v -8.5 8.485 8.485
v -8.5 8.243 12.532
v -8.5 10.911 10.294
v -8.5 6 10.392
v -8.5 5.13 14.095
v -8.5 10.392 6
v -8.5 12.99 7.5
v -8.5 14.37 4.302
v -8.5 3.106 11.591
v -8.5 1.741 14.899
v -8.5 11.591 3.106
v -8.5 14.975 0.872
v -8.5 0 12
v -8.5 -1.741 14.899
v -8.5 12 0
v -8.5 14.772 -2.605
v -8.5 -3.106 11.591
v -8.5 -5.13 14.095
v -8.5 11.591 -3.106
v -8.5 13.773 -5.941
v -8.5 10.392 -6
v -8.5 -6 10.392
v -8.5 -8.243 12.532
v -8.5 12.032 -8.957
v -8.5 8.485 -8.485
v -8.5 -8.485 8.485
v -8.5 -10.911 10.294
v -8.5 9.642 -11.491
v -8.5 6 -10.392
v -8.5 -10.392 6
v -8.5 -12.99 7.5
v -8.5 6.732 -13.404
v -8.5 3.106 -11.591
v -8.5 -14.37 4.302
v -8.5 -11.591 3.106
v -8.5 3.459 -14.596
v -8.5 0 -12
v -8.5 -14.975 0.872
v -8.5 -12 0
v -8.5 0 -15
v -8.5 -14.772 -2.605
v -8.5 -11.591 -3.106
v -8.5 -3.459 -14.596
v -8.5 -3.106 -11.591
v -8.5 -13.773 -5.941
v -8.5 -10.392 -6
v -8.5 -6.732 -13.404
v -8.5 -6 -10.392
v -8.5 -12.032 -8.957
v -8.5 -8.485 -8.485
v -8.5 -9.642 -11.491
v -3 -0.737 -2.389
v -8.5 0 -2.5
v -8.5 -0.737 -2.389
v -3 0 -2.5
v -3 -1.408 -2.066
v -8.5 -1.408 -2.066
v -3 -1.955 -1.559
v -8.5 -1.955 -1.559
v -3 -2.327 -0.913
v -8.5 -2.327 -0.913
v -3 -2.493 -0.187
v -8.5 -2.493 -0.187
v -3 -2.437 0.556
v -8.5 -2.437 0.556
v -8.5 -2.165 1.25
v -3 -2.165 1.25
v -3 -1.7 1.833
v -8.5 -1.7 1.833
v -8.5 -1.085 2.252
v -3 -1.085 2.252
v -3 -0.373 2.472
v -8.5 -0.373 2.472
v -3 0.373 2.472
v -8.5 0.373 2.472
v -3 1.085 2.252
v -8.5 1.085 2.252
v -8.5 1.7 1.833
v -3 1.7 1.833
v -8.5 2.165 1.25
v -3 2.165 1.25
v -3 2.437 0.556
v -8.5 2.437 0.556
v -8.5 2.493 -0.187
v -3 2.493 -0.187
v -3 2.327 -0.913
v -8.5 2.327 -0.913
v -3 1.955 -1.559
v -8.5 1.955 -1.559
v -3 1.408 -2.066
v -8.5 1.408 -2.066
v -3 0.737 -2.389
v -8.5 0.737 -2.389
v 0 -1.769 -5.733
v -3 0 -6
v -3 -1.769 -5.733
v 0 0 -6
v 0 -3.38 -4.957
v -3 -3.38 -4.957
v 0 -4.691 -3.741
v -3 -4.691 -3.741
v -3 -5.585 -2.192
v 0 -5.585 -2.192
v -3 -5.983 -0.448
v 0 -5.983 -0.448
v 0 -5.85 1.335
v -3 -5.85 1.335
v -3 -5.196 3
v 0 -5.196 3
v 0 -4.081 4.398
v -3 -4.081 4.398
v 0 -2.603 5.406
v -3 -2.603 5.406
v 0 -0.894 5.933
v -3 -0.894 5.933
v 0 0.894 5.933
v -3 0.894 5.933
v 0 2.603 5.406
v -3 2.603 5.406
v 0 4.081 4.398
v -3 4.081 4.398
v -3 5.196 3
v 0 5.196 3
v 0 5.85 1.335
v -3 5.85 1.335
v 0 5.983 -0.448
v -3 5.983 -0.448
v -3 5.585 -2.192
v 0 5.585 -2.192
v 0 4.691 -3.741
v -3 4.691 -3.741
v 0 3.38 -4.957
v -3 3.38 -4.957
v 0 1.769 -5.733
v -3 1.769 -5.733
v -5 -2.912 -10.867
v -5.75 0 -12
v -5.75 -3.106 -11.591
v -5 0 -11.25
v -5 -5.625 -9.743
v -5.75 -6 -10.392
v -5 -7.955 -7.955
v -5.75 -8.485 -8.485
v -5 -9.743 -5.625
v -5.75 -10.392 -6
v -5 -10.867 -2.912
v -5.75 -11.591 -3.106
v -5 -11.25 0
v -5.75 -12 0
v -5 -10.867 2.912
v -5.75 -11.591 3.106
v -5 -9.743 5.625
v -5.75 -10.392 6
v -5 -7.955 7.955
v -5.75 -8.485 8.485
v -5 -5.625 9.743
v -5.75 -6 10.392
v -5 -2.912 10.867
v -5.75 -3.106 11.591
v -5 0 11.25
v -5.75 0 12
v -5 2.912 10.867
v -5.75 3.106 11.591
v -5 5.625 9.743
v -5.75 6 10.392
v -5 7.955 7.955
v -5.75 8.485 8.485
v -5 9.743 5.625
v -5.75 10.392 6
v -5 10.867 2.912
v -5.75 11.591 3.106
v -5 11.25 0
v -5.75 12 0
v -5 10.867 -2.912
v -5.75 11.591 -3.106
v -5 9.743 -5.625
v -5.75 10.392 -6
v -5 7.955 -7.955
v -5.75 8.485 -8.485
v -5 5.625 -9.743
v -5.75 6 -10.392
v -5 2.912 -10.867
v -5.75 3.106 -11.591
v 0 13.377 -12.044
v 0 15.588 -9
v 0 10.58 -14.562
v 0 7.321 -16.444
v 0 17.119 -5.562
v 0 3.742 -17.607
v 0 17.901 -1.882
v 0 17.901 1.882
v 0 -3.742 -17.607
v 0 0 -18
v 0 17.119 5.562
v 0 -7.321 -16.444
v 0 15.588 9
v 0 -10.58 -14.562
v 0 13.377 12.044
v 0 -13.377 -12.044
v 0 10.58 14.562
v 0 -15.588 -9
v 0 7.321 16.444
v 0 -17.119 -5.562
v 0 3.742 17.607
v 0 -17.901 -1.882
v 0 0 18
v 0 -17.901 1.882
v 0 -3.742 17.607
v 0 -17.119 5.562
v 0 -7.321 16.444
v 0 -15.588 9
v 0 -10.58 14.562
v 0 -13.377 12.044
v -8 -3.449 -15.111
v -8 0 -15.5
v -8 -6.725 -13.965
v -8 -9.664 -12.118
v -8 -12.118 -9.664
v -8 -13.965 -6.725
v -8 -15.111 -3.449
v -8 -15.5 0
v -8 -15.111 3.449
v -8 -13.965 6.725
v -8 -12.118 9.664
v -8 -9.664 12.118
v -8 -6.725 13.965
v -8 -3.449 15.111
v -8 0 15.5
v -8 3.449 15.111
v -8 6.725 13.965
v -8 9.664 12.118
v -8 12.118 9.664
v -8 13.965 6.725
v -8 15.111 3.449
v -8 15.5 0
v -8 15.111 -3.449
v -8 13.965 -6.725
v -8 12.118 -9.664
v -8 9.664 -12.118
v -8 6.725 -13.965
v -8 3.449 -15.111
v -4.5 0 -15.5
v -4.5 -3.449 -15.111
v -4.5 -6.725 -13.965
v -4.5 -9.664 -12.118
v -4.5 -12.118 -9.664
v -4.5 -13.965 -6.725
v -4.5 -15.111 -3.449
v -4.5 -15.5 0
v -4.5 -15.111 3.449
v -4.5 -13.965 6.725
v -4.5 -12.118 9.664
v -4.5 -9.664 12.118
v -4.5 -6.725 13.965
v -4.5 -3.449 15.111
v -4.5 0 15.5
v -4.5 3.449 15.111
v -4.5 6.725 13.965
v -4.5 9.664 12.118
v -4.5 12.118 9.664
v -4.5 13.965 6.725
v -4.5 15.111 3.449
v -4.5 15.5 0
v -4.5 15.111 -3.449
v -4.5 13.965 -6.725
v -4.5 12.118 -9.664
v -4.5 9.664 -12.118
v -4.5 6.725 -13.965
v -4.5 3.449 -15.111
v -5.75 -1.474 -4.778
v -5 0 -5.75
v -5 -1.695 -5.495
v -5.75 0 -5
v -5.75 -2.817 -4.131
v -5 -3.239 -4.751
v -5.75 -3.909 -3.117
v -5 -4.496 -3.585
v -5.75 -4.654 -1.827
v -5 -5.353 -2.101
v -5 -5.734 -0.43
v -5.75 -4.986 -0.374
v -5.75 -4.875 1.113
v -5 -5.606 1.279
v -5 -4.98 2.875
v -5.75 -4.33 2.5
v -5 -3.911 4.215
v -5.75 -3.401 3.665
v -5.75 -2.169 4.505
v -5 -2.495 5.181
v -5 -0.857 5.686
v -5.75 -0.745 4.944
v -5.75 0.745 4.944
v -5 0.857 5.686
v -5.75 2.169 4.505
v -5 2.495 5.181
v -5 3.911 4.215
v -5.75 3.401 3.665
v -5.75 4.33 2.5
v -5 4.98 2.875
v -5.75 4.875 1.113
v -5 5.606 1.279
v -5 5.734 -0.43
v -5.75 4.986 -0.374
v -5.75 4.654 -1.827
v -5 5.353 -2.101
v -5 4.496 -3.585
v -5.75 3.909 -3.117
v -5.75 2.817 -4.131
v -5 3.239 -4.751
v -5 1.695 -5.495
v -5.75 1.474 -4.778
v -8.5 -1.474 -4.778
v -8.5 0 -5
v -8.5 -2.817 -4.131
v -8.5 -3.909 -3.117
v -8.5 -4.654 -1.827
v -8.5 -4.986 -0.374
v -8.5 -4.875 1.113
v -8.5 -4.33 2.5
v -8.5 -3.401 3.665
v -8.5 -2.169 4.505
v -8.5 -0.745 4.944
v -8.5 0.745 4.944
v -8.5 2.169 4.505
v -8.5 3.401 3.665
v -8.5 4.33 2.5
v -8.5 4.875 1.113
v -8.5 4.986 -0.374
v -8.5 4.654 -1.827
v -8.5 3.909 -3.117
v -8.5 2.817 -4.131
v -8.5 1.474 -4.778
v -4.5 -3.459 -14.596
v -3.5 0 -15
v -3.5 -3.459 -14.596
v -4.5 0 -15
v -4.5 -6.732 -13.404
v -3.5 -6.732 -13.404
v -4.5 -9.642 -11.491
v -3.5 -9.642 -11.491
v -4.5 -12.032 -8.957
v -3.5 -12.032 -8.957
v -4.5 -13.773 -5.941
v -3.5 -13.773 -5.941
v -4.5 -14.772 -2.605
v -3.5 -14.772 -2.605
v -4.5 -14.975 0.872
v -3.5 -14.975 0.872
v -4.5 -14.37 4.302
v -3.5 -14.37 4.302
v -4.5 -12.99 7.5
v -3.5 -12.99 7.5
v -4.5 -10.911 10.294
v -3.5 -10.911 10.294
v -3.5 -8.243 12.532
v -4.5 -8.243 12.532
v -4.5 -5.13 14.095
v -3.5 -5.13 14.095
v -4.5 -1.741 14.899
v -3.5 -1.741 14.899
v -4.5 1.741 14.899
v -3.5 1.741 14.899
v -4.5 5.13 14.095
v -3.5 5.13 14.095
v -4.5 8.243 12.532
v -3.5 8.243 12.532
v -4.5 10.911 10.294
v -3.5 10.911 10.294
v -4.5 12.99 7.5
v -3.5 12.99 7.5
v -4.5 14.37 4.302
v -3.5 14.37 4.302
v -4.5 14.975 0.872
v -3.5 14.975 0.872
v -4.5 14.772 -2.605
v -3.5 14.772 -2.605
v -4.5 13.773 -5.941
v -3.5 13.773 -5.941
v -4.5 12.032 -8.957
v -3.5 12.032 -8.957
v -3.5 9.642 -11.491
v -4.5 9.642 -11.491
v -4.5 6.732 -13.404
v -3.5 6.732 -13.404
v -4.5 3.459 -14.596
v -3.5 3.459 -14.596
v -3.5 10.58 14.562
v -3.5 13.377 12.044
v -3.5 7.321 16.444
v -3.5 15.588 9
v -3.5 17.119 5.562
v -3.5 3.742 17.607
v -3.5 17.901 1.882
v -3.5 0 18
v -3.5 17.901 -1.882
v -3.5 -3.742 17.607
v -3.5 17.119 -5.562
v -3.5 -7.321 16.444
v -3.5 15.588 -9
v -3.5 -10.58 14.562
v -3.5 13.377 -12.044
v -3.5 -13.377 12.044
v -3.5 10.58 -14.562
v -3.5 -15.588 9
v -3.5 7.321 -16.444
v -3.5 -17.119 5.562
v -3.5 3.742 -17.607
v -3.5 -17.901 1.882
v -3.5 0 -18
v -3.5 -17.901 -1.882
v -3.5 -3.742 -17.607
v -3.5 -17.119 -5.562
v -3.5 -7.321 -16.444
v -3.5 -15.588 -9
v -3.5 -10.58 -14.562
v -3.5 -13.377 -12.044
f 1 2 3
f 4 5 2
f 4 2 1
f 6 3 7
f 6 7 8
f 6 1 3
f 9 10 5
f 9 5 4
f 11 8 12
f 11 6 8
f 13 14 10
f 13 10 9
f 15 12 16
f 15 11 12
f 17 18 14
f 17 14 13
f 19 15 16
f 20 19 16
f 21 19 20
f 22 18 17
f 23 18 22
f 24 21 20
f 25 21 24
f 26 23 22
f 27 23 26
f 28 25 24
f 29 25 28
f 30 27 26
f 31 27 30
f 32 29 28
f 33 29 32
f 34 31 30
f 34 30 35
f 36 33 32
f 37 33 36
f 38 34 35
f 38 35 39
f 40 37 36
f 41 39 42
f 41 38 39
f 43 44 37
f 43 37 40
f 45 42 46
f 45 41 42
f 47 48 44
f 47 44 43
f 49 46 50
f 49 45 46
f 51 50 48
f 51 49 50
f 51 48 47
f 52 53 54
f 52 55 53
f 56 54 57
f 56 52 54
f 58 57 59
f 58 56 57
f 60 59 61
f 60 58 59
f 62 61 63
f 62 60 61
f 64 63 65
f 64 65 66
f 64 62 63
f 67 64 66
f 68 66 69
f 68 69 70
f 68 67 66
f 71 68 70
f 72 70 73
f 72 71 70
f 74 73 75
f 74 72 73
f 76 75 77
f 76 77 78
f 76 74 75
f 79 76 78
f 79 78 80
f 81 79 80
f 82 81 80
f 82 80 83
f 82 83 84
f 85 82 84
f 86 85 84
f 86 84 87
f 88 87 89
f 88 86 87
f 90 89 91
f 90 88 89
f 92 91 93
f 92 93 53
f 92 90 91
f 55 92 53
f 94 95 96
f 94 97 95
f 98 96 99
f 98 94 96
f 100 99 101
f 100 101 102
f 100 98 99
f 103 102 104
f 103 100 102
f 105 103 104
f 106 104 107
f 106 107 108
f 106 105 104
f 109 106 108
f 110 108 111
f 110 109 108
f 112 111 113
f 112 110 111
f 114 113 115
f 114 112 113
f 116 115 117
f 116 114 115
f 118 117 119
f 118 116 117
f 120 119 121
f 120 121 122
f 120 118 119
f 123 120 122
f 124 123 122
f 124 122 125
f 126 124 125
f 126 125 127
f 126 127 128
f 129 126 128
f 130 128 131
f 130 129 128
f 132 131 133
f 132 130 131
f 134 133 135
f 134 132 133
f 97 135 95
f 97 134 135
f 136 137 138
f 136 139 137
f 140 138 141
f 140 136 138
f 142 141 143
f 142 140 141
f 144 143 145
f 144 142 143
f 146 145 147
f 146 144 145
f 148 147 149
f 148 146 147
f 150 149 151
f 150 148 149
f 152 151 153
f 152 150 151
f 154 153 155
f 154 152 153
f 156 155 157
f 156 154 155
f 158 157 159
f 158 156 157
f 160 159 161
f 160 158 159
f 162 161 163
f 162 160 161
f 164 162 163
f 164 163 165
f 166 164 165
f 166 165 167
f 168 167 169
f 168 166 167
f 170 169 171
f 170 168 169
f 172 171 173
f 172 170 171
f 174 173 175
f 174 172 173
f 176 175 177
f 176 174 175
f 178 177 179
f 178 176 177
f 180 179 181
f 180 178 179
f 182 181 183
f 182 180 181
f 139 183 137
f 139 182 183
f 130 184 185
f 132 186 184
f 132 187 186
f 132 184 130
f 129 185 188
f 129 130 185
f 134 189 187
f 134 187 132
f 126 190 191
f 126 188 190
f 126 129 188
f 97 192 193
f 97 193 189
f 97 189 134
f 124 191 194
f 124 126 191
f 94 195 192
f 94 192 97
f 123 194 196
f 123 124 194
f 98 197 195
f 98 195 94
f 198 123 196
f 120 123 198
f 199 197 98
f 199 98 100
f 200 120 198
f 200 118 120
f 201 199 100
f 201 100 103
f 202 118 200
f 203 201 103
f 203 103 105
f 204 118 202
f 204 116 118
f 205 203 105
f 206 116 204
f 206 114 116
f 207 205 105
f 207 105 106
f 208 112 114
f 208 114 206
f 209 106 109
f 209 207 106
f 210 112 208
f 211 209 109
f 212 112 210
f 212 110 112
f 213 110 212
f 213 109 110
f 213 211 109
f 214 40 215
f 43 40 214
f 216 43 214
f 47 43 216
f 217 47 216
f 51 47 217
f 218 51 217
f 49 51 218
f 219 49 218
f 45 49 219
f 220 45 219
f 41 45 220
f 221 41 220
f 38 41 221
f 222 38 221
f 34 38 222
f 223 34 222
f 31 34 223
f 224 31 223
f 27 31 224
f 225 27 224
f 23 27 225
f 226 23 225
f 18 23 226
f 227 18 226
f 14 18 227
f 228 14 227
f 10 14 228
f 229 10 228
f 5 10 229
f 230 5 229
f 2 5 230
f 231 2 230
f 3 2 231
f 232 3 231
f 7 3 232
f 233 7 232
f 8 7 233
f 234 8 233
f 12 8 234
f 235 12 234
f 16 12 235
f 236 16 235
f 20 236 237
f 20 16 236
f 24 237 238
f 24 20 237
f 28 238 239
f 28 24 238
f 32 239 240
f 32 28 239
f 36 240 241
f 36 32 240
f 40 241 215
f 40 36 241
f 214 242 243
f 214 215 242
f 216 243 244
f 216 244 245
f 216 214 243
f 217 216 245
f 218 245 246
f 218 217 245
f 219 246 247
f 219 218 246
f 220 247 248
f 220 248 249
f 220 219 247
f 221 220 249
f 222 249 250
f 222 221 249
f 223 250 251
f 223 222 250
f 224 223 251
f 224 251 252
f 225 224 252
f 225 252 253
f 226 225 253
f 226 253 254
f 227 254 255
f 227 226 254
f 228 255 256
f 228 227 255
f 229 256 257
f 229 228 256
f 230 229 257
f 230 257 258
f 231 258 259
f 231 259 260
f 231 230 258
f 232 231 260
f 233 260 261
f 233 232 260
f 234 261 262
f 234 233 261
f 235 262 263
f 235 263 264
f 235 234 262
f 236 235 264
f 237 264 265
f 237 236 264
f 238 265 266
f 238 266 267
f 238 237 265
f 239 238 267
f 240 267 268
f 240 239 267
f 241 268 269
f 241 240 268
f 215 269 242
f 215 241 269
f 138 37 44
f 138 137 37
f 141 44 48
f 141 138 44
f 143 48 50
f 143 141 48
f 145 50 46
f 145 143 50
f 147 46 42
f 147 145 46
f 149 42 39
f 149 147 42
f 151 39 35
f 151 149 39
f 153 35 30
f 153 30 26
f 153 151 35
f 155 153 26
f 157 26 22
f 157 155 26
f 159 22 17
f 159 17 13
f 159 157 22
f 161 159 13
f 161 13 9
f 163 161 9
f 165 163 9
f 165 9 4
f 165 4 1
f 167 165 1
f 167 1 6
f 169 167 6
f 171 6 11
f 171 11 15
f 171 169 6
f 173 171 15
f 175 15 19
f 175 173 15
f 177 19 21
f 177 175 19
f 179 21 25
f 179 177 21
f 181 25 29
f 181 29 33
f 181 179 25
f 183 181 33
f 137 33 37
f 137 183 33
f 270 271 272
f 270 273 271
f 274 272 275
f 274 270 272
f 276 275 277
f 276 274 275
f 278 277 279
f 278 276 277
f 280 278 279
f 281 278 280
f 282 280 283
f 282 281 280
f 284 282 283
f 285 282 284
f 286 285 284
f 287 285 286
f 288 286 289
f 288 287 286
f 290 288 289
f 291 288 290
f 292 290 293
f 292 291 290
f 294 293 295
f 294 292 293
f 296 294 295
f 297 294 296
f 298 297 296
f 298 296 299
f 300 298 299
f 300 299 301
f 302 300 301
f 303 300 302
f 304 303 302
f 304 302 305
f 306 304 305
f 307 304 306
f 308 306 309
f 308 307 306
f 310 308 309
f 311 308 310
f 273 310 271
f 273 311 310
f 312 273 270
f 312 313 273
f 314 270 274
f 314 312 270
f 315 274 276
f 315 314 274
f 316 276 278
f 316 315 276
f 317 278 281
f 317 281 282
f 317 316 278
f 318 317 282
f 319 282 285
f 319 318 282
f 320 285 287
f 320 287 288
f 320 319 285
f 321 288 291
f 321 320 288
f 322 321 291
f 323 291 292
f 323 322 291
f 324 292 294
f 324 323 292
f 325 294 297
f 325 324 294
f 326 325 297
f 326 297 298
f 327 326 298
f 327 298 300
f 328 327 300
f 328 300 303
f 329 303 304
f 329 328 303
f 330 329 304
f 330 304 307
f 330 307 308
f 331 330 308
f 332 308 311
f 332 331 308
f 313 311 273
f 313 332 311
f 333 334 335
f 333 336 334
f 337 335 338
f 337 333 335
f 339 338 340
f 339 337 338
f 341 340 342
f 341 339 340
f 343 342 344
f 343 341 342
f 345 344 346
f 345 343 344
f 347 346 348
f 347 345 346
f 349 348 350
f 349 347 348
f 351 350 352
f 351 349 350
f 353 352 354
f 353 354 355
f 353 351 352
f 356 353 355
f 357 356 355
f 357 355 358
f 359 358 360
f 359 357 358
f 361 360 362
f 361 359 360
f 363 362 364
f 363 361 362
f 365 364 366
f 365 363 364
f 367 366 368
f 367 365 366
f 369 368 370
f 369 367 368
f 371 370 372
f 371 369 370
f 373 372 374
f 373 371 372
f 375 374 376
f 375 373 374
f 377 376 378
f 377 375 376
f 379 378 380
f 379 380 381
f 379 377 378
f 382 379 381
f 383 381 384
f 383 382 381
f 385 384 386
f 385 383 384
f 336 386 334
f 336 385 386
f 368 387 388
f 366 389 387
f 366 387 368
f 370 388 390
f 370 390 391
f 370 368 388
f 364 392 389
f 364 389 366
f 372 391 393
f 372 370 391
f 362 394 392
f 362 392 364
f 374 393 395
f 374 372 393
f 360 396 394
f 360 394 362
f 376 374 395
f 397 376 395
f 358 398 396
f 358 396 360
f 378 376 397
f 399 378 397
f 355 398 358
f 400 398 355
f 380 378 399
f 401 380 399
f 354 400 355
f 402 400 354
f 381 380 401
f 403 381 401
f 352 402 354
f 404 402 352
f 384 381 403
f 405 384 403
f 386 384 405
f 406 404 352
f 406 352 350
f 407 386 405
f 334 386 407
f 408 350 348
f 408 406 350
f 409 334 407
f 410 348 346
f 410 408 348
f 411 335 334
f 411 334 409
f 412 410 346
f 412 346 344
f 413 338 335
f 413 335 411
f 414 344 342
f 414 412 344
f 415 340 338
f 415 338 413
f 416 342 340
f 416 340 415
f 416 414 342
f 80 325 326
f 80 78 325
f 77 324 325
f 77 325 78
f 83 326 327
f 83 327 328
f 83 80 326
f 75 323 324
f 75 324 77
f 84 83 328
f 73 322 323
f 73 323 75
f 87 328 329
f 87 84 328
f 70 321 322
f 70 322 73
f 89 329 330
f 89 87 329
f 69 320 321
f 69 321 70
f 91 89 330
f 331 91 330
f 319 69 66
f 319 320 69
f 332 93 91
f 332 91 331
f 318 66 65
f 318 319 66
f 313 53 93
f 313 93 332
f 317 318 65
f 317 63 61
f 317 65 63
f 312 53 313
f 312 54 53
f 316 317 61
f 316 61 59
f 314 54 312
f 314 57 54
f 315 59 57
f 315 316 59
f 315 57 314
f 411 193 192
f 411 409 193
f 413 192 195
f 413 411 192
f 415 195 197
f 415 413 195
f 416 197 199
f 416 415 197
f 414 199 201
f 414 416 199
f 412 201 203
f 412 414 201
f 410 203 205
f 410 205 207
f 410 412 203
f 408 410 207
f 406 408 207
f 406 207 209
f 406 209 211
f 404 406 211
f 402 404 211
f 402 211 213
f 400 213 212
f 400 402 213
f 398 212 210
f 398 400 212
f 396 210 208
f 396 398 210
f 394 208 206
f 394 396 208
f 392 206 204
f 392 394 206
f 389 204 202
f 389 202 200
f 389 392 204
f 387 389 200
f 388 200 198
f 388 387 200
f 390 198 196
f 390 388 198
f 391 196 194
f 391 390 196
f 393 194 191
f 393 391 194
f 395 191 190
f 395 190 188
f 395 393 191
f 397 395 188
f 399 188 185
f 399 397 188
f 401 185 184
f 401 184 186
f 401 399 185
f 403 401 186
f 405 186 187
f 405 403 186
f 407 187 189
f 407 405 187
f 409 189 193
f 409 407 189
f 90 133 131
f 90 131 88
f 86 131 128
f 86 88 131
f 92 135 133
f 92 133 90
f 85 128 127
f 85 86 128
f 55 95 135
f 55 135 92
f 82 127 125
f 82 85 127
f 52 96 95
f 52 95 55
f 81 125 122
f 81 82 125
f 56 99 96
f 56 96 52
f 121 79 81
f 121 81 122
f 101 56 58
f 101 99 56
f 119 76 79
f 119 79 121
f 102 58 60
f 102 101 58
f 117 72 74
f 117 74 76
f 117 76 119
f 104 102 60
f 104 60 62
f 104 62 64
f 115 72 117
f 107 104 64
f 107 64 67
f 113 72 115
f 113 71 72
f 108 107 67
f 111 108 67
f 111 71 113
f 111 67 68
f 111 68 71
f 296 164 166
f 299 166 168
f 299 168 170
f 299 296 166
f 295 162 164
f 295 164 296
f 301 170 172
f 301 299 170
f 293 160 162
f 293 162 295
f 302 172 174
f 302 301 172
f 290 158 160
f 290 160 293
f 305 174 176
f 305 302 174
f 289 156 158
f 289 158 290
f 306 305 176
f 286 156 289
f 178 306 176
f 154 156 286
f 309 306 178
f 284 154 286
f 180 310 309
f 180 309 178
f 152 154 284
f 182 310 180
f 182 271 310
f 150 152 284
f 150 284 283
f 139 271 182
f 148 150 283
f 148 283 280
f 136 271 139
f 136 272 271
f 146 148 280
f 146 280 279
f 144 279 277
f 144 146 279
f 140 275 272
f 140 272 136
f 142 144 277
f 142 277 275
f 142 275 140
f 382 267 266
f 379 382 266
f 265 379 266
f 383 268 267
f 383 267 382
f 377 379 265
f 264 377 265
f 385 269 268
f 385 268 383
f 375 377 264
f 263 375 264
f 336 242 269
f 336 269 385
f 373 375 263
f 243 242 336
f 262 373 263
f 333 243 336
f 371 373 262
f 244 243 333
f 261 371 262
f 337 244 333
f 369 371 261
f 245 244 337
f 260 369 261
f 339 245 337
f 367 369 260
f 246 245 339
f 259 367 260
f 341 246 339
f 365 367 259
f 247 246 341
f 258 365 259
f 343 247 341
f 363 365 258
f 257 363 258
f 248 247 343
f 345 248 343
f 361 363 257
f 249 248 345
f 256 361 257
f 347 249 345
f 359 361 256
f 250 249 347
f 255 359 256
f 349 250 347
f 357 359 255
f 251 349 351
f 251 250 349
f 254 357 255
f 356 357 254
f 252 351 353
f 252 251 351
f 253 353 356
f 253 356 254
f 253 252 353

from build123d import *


with BuildPart() as part:
    # Esquisse1 → Révolution1789 (revolve)
    with BuildSketch(Plane.XY, mode=Mode.PRIVATE) as r_volution1789_sk:
        Polygon((0, 18), (-3.5, 18), (-3.5, 15), (-4.5, 15), (-4.5, 15.5), (-8, 15.5), (-8.5, 15), (-8.5, 12), (-5.75, 12), (-5, 11.25), (-5, 5.75), (-5.75, 5), (-8.5, 5), (-8.5, 2.5), (-3, 2.5), (-3, 6), (0, 6), align=None)
    revolve(r_volution1789_sk.sketch.rotate(Axis((0, 0, 0), (-1, 0, 0)), 90), axis=Axis((0, 0, 0), (-1, 0, 0)))


solid = part.part
